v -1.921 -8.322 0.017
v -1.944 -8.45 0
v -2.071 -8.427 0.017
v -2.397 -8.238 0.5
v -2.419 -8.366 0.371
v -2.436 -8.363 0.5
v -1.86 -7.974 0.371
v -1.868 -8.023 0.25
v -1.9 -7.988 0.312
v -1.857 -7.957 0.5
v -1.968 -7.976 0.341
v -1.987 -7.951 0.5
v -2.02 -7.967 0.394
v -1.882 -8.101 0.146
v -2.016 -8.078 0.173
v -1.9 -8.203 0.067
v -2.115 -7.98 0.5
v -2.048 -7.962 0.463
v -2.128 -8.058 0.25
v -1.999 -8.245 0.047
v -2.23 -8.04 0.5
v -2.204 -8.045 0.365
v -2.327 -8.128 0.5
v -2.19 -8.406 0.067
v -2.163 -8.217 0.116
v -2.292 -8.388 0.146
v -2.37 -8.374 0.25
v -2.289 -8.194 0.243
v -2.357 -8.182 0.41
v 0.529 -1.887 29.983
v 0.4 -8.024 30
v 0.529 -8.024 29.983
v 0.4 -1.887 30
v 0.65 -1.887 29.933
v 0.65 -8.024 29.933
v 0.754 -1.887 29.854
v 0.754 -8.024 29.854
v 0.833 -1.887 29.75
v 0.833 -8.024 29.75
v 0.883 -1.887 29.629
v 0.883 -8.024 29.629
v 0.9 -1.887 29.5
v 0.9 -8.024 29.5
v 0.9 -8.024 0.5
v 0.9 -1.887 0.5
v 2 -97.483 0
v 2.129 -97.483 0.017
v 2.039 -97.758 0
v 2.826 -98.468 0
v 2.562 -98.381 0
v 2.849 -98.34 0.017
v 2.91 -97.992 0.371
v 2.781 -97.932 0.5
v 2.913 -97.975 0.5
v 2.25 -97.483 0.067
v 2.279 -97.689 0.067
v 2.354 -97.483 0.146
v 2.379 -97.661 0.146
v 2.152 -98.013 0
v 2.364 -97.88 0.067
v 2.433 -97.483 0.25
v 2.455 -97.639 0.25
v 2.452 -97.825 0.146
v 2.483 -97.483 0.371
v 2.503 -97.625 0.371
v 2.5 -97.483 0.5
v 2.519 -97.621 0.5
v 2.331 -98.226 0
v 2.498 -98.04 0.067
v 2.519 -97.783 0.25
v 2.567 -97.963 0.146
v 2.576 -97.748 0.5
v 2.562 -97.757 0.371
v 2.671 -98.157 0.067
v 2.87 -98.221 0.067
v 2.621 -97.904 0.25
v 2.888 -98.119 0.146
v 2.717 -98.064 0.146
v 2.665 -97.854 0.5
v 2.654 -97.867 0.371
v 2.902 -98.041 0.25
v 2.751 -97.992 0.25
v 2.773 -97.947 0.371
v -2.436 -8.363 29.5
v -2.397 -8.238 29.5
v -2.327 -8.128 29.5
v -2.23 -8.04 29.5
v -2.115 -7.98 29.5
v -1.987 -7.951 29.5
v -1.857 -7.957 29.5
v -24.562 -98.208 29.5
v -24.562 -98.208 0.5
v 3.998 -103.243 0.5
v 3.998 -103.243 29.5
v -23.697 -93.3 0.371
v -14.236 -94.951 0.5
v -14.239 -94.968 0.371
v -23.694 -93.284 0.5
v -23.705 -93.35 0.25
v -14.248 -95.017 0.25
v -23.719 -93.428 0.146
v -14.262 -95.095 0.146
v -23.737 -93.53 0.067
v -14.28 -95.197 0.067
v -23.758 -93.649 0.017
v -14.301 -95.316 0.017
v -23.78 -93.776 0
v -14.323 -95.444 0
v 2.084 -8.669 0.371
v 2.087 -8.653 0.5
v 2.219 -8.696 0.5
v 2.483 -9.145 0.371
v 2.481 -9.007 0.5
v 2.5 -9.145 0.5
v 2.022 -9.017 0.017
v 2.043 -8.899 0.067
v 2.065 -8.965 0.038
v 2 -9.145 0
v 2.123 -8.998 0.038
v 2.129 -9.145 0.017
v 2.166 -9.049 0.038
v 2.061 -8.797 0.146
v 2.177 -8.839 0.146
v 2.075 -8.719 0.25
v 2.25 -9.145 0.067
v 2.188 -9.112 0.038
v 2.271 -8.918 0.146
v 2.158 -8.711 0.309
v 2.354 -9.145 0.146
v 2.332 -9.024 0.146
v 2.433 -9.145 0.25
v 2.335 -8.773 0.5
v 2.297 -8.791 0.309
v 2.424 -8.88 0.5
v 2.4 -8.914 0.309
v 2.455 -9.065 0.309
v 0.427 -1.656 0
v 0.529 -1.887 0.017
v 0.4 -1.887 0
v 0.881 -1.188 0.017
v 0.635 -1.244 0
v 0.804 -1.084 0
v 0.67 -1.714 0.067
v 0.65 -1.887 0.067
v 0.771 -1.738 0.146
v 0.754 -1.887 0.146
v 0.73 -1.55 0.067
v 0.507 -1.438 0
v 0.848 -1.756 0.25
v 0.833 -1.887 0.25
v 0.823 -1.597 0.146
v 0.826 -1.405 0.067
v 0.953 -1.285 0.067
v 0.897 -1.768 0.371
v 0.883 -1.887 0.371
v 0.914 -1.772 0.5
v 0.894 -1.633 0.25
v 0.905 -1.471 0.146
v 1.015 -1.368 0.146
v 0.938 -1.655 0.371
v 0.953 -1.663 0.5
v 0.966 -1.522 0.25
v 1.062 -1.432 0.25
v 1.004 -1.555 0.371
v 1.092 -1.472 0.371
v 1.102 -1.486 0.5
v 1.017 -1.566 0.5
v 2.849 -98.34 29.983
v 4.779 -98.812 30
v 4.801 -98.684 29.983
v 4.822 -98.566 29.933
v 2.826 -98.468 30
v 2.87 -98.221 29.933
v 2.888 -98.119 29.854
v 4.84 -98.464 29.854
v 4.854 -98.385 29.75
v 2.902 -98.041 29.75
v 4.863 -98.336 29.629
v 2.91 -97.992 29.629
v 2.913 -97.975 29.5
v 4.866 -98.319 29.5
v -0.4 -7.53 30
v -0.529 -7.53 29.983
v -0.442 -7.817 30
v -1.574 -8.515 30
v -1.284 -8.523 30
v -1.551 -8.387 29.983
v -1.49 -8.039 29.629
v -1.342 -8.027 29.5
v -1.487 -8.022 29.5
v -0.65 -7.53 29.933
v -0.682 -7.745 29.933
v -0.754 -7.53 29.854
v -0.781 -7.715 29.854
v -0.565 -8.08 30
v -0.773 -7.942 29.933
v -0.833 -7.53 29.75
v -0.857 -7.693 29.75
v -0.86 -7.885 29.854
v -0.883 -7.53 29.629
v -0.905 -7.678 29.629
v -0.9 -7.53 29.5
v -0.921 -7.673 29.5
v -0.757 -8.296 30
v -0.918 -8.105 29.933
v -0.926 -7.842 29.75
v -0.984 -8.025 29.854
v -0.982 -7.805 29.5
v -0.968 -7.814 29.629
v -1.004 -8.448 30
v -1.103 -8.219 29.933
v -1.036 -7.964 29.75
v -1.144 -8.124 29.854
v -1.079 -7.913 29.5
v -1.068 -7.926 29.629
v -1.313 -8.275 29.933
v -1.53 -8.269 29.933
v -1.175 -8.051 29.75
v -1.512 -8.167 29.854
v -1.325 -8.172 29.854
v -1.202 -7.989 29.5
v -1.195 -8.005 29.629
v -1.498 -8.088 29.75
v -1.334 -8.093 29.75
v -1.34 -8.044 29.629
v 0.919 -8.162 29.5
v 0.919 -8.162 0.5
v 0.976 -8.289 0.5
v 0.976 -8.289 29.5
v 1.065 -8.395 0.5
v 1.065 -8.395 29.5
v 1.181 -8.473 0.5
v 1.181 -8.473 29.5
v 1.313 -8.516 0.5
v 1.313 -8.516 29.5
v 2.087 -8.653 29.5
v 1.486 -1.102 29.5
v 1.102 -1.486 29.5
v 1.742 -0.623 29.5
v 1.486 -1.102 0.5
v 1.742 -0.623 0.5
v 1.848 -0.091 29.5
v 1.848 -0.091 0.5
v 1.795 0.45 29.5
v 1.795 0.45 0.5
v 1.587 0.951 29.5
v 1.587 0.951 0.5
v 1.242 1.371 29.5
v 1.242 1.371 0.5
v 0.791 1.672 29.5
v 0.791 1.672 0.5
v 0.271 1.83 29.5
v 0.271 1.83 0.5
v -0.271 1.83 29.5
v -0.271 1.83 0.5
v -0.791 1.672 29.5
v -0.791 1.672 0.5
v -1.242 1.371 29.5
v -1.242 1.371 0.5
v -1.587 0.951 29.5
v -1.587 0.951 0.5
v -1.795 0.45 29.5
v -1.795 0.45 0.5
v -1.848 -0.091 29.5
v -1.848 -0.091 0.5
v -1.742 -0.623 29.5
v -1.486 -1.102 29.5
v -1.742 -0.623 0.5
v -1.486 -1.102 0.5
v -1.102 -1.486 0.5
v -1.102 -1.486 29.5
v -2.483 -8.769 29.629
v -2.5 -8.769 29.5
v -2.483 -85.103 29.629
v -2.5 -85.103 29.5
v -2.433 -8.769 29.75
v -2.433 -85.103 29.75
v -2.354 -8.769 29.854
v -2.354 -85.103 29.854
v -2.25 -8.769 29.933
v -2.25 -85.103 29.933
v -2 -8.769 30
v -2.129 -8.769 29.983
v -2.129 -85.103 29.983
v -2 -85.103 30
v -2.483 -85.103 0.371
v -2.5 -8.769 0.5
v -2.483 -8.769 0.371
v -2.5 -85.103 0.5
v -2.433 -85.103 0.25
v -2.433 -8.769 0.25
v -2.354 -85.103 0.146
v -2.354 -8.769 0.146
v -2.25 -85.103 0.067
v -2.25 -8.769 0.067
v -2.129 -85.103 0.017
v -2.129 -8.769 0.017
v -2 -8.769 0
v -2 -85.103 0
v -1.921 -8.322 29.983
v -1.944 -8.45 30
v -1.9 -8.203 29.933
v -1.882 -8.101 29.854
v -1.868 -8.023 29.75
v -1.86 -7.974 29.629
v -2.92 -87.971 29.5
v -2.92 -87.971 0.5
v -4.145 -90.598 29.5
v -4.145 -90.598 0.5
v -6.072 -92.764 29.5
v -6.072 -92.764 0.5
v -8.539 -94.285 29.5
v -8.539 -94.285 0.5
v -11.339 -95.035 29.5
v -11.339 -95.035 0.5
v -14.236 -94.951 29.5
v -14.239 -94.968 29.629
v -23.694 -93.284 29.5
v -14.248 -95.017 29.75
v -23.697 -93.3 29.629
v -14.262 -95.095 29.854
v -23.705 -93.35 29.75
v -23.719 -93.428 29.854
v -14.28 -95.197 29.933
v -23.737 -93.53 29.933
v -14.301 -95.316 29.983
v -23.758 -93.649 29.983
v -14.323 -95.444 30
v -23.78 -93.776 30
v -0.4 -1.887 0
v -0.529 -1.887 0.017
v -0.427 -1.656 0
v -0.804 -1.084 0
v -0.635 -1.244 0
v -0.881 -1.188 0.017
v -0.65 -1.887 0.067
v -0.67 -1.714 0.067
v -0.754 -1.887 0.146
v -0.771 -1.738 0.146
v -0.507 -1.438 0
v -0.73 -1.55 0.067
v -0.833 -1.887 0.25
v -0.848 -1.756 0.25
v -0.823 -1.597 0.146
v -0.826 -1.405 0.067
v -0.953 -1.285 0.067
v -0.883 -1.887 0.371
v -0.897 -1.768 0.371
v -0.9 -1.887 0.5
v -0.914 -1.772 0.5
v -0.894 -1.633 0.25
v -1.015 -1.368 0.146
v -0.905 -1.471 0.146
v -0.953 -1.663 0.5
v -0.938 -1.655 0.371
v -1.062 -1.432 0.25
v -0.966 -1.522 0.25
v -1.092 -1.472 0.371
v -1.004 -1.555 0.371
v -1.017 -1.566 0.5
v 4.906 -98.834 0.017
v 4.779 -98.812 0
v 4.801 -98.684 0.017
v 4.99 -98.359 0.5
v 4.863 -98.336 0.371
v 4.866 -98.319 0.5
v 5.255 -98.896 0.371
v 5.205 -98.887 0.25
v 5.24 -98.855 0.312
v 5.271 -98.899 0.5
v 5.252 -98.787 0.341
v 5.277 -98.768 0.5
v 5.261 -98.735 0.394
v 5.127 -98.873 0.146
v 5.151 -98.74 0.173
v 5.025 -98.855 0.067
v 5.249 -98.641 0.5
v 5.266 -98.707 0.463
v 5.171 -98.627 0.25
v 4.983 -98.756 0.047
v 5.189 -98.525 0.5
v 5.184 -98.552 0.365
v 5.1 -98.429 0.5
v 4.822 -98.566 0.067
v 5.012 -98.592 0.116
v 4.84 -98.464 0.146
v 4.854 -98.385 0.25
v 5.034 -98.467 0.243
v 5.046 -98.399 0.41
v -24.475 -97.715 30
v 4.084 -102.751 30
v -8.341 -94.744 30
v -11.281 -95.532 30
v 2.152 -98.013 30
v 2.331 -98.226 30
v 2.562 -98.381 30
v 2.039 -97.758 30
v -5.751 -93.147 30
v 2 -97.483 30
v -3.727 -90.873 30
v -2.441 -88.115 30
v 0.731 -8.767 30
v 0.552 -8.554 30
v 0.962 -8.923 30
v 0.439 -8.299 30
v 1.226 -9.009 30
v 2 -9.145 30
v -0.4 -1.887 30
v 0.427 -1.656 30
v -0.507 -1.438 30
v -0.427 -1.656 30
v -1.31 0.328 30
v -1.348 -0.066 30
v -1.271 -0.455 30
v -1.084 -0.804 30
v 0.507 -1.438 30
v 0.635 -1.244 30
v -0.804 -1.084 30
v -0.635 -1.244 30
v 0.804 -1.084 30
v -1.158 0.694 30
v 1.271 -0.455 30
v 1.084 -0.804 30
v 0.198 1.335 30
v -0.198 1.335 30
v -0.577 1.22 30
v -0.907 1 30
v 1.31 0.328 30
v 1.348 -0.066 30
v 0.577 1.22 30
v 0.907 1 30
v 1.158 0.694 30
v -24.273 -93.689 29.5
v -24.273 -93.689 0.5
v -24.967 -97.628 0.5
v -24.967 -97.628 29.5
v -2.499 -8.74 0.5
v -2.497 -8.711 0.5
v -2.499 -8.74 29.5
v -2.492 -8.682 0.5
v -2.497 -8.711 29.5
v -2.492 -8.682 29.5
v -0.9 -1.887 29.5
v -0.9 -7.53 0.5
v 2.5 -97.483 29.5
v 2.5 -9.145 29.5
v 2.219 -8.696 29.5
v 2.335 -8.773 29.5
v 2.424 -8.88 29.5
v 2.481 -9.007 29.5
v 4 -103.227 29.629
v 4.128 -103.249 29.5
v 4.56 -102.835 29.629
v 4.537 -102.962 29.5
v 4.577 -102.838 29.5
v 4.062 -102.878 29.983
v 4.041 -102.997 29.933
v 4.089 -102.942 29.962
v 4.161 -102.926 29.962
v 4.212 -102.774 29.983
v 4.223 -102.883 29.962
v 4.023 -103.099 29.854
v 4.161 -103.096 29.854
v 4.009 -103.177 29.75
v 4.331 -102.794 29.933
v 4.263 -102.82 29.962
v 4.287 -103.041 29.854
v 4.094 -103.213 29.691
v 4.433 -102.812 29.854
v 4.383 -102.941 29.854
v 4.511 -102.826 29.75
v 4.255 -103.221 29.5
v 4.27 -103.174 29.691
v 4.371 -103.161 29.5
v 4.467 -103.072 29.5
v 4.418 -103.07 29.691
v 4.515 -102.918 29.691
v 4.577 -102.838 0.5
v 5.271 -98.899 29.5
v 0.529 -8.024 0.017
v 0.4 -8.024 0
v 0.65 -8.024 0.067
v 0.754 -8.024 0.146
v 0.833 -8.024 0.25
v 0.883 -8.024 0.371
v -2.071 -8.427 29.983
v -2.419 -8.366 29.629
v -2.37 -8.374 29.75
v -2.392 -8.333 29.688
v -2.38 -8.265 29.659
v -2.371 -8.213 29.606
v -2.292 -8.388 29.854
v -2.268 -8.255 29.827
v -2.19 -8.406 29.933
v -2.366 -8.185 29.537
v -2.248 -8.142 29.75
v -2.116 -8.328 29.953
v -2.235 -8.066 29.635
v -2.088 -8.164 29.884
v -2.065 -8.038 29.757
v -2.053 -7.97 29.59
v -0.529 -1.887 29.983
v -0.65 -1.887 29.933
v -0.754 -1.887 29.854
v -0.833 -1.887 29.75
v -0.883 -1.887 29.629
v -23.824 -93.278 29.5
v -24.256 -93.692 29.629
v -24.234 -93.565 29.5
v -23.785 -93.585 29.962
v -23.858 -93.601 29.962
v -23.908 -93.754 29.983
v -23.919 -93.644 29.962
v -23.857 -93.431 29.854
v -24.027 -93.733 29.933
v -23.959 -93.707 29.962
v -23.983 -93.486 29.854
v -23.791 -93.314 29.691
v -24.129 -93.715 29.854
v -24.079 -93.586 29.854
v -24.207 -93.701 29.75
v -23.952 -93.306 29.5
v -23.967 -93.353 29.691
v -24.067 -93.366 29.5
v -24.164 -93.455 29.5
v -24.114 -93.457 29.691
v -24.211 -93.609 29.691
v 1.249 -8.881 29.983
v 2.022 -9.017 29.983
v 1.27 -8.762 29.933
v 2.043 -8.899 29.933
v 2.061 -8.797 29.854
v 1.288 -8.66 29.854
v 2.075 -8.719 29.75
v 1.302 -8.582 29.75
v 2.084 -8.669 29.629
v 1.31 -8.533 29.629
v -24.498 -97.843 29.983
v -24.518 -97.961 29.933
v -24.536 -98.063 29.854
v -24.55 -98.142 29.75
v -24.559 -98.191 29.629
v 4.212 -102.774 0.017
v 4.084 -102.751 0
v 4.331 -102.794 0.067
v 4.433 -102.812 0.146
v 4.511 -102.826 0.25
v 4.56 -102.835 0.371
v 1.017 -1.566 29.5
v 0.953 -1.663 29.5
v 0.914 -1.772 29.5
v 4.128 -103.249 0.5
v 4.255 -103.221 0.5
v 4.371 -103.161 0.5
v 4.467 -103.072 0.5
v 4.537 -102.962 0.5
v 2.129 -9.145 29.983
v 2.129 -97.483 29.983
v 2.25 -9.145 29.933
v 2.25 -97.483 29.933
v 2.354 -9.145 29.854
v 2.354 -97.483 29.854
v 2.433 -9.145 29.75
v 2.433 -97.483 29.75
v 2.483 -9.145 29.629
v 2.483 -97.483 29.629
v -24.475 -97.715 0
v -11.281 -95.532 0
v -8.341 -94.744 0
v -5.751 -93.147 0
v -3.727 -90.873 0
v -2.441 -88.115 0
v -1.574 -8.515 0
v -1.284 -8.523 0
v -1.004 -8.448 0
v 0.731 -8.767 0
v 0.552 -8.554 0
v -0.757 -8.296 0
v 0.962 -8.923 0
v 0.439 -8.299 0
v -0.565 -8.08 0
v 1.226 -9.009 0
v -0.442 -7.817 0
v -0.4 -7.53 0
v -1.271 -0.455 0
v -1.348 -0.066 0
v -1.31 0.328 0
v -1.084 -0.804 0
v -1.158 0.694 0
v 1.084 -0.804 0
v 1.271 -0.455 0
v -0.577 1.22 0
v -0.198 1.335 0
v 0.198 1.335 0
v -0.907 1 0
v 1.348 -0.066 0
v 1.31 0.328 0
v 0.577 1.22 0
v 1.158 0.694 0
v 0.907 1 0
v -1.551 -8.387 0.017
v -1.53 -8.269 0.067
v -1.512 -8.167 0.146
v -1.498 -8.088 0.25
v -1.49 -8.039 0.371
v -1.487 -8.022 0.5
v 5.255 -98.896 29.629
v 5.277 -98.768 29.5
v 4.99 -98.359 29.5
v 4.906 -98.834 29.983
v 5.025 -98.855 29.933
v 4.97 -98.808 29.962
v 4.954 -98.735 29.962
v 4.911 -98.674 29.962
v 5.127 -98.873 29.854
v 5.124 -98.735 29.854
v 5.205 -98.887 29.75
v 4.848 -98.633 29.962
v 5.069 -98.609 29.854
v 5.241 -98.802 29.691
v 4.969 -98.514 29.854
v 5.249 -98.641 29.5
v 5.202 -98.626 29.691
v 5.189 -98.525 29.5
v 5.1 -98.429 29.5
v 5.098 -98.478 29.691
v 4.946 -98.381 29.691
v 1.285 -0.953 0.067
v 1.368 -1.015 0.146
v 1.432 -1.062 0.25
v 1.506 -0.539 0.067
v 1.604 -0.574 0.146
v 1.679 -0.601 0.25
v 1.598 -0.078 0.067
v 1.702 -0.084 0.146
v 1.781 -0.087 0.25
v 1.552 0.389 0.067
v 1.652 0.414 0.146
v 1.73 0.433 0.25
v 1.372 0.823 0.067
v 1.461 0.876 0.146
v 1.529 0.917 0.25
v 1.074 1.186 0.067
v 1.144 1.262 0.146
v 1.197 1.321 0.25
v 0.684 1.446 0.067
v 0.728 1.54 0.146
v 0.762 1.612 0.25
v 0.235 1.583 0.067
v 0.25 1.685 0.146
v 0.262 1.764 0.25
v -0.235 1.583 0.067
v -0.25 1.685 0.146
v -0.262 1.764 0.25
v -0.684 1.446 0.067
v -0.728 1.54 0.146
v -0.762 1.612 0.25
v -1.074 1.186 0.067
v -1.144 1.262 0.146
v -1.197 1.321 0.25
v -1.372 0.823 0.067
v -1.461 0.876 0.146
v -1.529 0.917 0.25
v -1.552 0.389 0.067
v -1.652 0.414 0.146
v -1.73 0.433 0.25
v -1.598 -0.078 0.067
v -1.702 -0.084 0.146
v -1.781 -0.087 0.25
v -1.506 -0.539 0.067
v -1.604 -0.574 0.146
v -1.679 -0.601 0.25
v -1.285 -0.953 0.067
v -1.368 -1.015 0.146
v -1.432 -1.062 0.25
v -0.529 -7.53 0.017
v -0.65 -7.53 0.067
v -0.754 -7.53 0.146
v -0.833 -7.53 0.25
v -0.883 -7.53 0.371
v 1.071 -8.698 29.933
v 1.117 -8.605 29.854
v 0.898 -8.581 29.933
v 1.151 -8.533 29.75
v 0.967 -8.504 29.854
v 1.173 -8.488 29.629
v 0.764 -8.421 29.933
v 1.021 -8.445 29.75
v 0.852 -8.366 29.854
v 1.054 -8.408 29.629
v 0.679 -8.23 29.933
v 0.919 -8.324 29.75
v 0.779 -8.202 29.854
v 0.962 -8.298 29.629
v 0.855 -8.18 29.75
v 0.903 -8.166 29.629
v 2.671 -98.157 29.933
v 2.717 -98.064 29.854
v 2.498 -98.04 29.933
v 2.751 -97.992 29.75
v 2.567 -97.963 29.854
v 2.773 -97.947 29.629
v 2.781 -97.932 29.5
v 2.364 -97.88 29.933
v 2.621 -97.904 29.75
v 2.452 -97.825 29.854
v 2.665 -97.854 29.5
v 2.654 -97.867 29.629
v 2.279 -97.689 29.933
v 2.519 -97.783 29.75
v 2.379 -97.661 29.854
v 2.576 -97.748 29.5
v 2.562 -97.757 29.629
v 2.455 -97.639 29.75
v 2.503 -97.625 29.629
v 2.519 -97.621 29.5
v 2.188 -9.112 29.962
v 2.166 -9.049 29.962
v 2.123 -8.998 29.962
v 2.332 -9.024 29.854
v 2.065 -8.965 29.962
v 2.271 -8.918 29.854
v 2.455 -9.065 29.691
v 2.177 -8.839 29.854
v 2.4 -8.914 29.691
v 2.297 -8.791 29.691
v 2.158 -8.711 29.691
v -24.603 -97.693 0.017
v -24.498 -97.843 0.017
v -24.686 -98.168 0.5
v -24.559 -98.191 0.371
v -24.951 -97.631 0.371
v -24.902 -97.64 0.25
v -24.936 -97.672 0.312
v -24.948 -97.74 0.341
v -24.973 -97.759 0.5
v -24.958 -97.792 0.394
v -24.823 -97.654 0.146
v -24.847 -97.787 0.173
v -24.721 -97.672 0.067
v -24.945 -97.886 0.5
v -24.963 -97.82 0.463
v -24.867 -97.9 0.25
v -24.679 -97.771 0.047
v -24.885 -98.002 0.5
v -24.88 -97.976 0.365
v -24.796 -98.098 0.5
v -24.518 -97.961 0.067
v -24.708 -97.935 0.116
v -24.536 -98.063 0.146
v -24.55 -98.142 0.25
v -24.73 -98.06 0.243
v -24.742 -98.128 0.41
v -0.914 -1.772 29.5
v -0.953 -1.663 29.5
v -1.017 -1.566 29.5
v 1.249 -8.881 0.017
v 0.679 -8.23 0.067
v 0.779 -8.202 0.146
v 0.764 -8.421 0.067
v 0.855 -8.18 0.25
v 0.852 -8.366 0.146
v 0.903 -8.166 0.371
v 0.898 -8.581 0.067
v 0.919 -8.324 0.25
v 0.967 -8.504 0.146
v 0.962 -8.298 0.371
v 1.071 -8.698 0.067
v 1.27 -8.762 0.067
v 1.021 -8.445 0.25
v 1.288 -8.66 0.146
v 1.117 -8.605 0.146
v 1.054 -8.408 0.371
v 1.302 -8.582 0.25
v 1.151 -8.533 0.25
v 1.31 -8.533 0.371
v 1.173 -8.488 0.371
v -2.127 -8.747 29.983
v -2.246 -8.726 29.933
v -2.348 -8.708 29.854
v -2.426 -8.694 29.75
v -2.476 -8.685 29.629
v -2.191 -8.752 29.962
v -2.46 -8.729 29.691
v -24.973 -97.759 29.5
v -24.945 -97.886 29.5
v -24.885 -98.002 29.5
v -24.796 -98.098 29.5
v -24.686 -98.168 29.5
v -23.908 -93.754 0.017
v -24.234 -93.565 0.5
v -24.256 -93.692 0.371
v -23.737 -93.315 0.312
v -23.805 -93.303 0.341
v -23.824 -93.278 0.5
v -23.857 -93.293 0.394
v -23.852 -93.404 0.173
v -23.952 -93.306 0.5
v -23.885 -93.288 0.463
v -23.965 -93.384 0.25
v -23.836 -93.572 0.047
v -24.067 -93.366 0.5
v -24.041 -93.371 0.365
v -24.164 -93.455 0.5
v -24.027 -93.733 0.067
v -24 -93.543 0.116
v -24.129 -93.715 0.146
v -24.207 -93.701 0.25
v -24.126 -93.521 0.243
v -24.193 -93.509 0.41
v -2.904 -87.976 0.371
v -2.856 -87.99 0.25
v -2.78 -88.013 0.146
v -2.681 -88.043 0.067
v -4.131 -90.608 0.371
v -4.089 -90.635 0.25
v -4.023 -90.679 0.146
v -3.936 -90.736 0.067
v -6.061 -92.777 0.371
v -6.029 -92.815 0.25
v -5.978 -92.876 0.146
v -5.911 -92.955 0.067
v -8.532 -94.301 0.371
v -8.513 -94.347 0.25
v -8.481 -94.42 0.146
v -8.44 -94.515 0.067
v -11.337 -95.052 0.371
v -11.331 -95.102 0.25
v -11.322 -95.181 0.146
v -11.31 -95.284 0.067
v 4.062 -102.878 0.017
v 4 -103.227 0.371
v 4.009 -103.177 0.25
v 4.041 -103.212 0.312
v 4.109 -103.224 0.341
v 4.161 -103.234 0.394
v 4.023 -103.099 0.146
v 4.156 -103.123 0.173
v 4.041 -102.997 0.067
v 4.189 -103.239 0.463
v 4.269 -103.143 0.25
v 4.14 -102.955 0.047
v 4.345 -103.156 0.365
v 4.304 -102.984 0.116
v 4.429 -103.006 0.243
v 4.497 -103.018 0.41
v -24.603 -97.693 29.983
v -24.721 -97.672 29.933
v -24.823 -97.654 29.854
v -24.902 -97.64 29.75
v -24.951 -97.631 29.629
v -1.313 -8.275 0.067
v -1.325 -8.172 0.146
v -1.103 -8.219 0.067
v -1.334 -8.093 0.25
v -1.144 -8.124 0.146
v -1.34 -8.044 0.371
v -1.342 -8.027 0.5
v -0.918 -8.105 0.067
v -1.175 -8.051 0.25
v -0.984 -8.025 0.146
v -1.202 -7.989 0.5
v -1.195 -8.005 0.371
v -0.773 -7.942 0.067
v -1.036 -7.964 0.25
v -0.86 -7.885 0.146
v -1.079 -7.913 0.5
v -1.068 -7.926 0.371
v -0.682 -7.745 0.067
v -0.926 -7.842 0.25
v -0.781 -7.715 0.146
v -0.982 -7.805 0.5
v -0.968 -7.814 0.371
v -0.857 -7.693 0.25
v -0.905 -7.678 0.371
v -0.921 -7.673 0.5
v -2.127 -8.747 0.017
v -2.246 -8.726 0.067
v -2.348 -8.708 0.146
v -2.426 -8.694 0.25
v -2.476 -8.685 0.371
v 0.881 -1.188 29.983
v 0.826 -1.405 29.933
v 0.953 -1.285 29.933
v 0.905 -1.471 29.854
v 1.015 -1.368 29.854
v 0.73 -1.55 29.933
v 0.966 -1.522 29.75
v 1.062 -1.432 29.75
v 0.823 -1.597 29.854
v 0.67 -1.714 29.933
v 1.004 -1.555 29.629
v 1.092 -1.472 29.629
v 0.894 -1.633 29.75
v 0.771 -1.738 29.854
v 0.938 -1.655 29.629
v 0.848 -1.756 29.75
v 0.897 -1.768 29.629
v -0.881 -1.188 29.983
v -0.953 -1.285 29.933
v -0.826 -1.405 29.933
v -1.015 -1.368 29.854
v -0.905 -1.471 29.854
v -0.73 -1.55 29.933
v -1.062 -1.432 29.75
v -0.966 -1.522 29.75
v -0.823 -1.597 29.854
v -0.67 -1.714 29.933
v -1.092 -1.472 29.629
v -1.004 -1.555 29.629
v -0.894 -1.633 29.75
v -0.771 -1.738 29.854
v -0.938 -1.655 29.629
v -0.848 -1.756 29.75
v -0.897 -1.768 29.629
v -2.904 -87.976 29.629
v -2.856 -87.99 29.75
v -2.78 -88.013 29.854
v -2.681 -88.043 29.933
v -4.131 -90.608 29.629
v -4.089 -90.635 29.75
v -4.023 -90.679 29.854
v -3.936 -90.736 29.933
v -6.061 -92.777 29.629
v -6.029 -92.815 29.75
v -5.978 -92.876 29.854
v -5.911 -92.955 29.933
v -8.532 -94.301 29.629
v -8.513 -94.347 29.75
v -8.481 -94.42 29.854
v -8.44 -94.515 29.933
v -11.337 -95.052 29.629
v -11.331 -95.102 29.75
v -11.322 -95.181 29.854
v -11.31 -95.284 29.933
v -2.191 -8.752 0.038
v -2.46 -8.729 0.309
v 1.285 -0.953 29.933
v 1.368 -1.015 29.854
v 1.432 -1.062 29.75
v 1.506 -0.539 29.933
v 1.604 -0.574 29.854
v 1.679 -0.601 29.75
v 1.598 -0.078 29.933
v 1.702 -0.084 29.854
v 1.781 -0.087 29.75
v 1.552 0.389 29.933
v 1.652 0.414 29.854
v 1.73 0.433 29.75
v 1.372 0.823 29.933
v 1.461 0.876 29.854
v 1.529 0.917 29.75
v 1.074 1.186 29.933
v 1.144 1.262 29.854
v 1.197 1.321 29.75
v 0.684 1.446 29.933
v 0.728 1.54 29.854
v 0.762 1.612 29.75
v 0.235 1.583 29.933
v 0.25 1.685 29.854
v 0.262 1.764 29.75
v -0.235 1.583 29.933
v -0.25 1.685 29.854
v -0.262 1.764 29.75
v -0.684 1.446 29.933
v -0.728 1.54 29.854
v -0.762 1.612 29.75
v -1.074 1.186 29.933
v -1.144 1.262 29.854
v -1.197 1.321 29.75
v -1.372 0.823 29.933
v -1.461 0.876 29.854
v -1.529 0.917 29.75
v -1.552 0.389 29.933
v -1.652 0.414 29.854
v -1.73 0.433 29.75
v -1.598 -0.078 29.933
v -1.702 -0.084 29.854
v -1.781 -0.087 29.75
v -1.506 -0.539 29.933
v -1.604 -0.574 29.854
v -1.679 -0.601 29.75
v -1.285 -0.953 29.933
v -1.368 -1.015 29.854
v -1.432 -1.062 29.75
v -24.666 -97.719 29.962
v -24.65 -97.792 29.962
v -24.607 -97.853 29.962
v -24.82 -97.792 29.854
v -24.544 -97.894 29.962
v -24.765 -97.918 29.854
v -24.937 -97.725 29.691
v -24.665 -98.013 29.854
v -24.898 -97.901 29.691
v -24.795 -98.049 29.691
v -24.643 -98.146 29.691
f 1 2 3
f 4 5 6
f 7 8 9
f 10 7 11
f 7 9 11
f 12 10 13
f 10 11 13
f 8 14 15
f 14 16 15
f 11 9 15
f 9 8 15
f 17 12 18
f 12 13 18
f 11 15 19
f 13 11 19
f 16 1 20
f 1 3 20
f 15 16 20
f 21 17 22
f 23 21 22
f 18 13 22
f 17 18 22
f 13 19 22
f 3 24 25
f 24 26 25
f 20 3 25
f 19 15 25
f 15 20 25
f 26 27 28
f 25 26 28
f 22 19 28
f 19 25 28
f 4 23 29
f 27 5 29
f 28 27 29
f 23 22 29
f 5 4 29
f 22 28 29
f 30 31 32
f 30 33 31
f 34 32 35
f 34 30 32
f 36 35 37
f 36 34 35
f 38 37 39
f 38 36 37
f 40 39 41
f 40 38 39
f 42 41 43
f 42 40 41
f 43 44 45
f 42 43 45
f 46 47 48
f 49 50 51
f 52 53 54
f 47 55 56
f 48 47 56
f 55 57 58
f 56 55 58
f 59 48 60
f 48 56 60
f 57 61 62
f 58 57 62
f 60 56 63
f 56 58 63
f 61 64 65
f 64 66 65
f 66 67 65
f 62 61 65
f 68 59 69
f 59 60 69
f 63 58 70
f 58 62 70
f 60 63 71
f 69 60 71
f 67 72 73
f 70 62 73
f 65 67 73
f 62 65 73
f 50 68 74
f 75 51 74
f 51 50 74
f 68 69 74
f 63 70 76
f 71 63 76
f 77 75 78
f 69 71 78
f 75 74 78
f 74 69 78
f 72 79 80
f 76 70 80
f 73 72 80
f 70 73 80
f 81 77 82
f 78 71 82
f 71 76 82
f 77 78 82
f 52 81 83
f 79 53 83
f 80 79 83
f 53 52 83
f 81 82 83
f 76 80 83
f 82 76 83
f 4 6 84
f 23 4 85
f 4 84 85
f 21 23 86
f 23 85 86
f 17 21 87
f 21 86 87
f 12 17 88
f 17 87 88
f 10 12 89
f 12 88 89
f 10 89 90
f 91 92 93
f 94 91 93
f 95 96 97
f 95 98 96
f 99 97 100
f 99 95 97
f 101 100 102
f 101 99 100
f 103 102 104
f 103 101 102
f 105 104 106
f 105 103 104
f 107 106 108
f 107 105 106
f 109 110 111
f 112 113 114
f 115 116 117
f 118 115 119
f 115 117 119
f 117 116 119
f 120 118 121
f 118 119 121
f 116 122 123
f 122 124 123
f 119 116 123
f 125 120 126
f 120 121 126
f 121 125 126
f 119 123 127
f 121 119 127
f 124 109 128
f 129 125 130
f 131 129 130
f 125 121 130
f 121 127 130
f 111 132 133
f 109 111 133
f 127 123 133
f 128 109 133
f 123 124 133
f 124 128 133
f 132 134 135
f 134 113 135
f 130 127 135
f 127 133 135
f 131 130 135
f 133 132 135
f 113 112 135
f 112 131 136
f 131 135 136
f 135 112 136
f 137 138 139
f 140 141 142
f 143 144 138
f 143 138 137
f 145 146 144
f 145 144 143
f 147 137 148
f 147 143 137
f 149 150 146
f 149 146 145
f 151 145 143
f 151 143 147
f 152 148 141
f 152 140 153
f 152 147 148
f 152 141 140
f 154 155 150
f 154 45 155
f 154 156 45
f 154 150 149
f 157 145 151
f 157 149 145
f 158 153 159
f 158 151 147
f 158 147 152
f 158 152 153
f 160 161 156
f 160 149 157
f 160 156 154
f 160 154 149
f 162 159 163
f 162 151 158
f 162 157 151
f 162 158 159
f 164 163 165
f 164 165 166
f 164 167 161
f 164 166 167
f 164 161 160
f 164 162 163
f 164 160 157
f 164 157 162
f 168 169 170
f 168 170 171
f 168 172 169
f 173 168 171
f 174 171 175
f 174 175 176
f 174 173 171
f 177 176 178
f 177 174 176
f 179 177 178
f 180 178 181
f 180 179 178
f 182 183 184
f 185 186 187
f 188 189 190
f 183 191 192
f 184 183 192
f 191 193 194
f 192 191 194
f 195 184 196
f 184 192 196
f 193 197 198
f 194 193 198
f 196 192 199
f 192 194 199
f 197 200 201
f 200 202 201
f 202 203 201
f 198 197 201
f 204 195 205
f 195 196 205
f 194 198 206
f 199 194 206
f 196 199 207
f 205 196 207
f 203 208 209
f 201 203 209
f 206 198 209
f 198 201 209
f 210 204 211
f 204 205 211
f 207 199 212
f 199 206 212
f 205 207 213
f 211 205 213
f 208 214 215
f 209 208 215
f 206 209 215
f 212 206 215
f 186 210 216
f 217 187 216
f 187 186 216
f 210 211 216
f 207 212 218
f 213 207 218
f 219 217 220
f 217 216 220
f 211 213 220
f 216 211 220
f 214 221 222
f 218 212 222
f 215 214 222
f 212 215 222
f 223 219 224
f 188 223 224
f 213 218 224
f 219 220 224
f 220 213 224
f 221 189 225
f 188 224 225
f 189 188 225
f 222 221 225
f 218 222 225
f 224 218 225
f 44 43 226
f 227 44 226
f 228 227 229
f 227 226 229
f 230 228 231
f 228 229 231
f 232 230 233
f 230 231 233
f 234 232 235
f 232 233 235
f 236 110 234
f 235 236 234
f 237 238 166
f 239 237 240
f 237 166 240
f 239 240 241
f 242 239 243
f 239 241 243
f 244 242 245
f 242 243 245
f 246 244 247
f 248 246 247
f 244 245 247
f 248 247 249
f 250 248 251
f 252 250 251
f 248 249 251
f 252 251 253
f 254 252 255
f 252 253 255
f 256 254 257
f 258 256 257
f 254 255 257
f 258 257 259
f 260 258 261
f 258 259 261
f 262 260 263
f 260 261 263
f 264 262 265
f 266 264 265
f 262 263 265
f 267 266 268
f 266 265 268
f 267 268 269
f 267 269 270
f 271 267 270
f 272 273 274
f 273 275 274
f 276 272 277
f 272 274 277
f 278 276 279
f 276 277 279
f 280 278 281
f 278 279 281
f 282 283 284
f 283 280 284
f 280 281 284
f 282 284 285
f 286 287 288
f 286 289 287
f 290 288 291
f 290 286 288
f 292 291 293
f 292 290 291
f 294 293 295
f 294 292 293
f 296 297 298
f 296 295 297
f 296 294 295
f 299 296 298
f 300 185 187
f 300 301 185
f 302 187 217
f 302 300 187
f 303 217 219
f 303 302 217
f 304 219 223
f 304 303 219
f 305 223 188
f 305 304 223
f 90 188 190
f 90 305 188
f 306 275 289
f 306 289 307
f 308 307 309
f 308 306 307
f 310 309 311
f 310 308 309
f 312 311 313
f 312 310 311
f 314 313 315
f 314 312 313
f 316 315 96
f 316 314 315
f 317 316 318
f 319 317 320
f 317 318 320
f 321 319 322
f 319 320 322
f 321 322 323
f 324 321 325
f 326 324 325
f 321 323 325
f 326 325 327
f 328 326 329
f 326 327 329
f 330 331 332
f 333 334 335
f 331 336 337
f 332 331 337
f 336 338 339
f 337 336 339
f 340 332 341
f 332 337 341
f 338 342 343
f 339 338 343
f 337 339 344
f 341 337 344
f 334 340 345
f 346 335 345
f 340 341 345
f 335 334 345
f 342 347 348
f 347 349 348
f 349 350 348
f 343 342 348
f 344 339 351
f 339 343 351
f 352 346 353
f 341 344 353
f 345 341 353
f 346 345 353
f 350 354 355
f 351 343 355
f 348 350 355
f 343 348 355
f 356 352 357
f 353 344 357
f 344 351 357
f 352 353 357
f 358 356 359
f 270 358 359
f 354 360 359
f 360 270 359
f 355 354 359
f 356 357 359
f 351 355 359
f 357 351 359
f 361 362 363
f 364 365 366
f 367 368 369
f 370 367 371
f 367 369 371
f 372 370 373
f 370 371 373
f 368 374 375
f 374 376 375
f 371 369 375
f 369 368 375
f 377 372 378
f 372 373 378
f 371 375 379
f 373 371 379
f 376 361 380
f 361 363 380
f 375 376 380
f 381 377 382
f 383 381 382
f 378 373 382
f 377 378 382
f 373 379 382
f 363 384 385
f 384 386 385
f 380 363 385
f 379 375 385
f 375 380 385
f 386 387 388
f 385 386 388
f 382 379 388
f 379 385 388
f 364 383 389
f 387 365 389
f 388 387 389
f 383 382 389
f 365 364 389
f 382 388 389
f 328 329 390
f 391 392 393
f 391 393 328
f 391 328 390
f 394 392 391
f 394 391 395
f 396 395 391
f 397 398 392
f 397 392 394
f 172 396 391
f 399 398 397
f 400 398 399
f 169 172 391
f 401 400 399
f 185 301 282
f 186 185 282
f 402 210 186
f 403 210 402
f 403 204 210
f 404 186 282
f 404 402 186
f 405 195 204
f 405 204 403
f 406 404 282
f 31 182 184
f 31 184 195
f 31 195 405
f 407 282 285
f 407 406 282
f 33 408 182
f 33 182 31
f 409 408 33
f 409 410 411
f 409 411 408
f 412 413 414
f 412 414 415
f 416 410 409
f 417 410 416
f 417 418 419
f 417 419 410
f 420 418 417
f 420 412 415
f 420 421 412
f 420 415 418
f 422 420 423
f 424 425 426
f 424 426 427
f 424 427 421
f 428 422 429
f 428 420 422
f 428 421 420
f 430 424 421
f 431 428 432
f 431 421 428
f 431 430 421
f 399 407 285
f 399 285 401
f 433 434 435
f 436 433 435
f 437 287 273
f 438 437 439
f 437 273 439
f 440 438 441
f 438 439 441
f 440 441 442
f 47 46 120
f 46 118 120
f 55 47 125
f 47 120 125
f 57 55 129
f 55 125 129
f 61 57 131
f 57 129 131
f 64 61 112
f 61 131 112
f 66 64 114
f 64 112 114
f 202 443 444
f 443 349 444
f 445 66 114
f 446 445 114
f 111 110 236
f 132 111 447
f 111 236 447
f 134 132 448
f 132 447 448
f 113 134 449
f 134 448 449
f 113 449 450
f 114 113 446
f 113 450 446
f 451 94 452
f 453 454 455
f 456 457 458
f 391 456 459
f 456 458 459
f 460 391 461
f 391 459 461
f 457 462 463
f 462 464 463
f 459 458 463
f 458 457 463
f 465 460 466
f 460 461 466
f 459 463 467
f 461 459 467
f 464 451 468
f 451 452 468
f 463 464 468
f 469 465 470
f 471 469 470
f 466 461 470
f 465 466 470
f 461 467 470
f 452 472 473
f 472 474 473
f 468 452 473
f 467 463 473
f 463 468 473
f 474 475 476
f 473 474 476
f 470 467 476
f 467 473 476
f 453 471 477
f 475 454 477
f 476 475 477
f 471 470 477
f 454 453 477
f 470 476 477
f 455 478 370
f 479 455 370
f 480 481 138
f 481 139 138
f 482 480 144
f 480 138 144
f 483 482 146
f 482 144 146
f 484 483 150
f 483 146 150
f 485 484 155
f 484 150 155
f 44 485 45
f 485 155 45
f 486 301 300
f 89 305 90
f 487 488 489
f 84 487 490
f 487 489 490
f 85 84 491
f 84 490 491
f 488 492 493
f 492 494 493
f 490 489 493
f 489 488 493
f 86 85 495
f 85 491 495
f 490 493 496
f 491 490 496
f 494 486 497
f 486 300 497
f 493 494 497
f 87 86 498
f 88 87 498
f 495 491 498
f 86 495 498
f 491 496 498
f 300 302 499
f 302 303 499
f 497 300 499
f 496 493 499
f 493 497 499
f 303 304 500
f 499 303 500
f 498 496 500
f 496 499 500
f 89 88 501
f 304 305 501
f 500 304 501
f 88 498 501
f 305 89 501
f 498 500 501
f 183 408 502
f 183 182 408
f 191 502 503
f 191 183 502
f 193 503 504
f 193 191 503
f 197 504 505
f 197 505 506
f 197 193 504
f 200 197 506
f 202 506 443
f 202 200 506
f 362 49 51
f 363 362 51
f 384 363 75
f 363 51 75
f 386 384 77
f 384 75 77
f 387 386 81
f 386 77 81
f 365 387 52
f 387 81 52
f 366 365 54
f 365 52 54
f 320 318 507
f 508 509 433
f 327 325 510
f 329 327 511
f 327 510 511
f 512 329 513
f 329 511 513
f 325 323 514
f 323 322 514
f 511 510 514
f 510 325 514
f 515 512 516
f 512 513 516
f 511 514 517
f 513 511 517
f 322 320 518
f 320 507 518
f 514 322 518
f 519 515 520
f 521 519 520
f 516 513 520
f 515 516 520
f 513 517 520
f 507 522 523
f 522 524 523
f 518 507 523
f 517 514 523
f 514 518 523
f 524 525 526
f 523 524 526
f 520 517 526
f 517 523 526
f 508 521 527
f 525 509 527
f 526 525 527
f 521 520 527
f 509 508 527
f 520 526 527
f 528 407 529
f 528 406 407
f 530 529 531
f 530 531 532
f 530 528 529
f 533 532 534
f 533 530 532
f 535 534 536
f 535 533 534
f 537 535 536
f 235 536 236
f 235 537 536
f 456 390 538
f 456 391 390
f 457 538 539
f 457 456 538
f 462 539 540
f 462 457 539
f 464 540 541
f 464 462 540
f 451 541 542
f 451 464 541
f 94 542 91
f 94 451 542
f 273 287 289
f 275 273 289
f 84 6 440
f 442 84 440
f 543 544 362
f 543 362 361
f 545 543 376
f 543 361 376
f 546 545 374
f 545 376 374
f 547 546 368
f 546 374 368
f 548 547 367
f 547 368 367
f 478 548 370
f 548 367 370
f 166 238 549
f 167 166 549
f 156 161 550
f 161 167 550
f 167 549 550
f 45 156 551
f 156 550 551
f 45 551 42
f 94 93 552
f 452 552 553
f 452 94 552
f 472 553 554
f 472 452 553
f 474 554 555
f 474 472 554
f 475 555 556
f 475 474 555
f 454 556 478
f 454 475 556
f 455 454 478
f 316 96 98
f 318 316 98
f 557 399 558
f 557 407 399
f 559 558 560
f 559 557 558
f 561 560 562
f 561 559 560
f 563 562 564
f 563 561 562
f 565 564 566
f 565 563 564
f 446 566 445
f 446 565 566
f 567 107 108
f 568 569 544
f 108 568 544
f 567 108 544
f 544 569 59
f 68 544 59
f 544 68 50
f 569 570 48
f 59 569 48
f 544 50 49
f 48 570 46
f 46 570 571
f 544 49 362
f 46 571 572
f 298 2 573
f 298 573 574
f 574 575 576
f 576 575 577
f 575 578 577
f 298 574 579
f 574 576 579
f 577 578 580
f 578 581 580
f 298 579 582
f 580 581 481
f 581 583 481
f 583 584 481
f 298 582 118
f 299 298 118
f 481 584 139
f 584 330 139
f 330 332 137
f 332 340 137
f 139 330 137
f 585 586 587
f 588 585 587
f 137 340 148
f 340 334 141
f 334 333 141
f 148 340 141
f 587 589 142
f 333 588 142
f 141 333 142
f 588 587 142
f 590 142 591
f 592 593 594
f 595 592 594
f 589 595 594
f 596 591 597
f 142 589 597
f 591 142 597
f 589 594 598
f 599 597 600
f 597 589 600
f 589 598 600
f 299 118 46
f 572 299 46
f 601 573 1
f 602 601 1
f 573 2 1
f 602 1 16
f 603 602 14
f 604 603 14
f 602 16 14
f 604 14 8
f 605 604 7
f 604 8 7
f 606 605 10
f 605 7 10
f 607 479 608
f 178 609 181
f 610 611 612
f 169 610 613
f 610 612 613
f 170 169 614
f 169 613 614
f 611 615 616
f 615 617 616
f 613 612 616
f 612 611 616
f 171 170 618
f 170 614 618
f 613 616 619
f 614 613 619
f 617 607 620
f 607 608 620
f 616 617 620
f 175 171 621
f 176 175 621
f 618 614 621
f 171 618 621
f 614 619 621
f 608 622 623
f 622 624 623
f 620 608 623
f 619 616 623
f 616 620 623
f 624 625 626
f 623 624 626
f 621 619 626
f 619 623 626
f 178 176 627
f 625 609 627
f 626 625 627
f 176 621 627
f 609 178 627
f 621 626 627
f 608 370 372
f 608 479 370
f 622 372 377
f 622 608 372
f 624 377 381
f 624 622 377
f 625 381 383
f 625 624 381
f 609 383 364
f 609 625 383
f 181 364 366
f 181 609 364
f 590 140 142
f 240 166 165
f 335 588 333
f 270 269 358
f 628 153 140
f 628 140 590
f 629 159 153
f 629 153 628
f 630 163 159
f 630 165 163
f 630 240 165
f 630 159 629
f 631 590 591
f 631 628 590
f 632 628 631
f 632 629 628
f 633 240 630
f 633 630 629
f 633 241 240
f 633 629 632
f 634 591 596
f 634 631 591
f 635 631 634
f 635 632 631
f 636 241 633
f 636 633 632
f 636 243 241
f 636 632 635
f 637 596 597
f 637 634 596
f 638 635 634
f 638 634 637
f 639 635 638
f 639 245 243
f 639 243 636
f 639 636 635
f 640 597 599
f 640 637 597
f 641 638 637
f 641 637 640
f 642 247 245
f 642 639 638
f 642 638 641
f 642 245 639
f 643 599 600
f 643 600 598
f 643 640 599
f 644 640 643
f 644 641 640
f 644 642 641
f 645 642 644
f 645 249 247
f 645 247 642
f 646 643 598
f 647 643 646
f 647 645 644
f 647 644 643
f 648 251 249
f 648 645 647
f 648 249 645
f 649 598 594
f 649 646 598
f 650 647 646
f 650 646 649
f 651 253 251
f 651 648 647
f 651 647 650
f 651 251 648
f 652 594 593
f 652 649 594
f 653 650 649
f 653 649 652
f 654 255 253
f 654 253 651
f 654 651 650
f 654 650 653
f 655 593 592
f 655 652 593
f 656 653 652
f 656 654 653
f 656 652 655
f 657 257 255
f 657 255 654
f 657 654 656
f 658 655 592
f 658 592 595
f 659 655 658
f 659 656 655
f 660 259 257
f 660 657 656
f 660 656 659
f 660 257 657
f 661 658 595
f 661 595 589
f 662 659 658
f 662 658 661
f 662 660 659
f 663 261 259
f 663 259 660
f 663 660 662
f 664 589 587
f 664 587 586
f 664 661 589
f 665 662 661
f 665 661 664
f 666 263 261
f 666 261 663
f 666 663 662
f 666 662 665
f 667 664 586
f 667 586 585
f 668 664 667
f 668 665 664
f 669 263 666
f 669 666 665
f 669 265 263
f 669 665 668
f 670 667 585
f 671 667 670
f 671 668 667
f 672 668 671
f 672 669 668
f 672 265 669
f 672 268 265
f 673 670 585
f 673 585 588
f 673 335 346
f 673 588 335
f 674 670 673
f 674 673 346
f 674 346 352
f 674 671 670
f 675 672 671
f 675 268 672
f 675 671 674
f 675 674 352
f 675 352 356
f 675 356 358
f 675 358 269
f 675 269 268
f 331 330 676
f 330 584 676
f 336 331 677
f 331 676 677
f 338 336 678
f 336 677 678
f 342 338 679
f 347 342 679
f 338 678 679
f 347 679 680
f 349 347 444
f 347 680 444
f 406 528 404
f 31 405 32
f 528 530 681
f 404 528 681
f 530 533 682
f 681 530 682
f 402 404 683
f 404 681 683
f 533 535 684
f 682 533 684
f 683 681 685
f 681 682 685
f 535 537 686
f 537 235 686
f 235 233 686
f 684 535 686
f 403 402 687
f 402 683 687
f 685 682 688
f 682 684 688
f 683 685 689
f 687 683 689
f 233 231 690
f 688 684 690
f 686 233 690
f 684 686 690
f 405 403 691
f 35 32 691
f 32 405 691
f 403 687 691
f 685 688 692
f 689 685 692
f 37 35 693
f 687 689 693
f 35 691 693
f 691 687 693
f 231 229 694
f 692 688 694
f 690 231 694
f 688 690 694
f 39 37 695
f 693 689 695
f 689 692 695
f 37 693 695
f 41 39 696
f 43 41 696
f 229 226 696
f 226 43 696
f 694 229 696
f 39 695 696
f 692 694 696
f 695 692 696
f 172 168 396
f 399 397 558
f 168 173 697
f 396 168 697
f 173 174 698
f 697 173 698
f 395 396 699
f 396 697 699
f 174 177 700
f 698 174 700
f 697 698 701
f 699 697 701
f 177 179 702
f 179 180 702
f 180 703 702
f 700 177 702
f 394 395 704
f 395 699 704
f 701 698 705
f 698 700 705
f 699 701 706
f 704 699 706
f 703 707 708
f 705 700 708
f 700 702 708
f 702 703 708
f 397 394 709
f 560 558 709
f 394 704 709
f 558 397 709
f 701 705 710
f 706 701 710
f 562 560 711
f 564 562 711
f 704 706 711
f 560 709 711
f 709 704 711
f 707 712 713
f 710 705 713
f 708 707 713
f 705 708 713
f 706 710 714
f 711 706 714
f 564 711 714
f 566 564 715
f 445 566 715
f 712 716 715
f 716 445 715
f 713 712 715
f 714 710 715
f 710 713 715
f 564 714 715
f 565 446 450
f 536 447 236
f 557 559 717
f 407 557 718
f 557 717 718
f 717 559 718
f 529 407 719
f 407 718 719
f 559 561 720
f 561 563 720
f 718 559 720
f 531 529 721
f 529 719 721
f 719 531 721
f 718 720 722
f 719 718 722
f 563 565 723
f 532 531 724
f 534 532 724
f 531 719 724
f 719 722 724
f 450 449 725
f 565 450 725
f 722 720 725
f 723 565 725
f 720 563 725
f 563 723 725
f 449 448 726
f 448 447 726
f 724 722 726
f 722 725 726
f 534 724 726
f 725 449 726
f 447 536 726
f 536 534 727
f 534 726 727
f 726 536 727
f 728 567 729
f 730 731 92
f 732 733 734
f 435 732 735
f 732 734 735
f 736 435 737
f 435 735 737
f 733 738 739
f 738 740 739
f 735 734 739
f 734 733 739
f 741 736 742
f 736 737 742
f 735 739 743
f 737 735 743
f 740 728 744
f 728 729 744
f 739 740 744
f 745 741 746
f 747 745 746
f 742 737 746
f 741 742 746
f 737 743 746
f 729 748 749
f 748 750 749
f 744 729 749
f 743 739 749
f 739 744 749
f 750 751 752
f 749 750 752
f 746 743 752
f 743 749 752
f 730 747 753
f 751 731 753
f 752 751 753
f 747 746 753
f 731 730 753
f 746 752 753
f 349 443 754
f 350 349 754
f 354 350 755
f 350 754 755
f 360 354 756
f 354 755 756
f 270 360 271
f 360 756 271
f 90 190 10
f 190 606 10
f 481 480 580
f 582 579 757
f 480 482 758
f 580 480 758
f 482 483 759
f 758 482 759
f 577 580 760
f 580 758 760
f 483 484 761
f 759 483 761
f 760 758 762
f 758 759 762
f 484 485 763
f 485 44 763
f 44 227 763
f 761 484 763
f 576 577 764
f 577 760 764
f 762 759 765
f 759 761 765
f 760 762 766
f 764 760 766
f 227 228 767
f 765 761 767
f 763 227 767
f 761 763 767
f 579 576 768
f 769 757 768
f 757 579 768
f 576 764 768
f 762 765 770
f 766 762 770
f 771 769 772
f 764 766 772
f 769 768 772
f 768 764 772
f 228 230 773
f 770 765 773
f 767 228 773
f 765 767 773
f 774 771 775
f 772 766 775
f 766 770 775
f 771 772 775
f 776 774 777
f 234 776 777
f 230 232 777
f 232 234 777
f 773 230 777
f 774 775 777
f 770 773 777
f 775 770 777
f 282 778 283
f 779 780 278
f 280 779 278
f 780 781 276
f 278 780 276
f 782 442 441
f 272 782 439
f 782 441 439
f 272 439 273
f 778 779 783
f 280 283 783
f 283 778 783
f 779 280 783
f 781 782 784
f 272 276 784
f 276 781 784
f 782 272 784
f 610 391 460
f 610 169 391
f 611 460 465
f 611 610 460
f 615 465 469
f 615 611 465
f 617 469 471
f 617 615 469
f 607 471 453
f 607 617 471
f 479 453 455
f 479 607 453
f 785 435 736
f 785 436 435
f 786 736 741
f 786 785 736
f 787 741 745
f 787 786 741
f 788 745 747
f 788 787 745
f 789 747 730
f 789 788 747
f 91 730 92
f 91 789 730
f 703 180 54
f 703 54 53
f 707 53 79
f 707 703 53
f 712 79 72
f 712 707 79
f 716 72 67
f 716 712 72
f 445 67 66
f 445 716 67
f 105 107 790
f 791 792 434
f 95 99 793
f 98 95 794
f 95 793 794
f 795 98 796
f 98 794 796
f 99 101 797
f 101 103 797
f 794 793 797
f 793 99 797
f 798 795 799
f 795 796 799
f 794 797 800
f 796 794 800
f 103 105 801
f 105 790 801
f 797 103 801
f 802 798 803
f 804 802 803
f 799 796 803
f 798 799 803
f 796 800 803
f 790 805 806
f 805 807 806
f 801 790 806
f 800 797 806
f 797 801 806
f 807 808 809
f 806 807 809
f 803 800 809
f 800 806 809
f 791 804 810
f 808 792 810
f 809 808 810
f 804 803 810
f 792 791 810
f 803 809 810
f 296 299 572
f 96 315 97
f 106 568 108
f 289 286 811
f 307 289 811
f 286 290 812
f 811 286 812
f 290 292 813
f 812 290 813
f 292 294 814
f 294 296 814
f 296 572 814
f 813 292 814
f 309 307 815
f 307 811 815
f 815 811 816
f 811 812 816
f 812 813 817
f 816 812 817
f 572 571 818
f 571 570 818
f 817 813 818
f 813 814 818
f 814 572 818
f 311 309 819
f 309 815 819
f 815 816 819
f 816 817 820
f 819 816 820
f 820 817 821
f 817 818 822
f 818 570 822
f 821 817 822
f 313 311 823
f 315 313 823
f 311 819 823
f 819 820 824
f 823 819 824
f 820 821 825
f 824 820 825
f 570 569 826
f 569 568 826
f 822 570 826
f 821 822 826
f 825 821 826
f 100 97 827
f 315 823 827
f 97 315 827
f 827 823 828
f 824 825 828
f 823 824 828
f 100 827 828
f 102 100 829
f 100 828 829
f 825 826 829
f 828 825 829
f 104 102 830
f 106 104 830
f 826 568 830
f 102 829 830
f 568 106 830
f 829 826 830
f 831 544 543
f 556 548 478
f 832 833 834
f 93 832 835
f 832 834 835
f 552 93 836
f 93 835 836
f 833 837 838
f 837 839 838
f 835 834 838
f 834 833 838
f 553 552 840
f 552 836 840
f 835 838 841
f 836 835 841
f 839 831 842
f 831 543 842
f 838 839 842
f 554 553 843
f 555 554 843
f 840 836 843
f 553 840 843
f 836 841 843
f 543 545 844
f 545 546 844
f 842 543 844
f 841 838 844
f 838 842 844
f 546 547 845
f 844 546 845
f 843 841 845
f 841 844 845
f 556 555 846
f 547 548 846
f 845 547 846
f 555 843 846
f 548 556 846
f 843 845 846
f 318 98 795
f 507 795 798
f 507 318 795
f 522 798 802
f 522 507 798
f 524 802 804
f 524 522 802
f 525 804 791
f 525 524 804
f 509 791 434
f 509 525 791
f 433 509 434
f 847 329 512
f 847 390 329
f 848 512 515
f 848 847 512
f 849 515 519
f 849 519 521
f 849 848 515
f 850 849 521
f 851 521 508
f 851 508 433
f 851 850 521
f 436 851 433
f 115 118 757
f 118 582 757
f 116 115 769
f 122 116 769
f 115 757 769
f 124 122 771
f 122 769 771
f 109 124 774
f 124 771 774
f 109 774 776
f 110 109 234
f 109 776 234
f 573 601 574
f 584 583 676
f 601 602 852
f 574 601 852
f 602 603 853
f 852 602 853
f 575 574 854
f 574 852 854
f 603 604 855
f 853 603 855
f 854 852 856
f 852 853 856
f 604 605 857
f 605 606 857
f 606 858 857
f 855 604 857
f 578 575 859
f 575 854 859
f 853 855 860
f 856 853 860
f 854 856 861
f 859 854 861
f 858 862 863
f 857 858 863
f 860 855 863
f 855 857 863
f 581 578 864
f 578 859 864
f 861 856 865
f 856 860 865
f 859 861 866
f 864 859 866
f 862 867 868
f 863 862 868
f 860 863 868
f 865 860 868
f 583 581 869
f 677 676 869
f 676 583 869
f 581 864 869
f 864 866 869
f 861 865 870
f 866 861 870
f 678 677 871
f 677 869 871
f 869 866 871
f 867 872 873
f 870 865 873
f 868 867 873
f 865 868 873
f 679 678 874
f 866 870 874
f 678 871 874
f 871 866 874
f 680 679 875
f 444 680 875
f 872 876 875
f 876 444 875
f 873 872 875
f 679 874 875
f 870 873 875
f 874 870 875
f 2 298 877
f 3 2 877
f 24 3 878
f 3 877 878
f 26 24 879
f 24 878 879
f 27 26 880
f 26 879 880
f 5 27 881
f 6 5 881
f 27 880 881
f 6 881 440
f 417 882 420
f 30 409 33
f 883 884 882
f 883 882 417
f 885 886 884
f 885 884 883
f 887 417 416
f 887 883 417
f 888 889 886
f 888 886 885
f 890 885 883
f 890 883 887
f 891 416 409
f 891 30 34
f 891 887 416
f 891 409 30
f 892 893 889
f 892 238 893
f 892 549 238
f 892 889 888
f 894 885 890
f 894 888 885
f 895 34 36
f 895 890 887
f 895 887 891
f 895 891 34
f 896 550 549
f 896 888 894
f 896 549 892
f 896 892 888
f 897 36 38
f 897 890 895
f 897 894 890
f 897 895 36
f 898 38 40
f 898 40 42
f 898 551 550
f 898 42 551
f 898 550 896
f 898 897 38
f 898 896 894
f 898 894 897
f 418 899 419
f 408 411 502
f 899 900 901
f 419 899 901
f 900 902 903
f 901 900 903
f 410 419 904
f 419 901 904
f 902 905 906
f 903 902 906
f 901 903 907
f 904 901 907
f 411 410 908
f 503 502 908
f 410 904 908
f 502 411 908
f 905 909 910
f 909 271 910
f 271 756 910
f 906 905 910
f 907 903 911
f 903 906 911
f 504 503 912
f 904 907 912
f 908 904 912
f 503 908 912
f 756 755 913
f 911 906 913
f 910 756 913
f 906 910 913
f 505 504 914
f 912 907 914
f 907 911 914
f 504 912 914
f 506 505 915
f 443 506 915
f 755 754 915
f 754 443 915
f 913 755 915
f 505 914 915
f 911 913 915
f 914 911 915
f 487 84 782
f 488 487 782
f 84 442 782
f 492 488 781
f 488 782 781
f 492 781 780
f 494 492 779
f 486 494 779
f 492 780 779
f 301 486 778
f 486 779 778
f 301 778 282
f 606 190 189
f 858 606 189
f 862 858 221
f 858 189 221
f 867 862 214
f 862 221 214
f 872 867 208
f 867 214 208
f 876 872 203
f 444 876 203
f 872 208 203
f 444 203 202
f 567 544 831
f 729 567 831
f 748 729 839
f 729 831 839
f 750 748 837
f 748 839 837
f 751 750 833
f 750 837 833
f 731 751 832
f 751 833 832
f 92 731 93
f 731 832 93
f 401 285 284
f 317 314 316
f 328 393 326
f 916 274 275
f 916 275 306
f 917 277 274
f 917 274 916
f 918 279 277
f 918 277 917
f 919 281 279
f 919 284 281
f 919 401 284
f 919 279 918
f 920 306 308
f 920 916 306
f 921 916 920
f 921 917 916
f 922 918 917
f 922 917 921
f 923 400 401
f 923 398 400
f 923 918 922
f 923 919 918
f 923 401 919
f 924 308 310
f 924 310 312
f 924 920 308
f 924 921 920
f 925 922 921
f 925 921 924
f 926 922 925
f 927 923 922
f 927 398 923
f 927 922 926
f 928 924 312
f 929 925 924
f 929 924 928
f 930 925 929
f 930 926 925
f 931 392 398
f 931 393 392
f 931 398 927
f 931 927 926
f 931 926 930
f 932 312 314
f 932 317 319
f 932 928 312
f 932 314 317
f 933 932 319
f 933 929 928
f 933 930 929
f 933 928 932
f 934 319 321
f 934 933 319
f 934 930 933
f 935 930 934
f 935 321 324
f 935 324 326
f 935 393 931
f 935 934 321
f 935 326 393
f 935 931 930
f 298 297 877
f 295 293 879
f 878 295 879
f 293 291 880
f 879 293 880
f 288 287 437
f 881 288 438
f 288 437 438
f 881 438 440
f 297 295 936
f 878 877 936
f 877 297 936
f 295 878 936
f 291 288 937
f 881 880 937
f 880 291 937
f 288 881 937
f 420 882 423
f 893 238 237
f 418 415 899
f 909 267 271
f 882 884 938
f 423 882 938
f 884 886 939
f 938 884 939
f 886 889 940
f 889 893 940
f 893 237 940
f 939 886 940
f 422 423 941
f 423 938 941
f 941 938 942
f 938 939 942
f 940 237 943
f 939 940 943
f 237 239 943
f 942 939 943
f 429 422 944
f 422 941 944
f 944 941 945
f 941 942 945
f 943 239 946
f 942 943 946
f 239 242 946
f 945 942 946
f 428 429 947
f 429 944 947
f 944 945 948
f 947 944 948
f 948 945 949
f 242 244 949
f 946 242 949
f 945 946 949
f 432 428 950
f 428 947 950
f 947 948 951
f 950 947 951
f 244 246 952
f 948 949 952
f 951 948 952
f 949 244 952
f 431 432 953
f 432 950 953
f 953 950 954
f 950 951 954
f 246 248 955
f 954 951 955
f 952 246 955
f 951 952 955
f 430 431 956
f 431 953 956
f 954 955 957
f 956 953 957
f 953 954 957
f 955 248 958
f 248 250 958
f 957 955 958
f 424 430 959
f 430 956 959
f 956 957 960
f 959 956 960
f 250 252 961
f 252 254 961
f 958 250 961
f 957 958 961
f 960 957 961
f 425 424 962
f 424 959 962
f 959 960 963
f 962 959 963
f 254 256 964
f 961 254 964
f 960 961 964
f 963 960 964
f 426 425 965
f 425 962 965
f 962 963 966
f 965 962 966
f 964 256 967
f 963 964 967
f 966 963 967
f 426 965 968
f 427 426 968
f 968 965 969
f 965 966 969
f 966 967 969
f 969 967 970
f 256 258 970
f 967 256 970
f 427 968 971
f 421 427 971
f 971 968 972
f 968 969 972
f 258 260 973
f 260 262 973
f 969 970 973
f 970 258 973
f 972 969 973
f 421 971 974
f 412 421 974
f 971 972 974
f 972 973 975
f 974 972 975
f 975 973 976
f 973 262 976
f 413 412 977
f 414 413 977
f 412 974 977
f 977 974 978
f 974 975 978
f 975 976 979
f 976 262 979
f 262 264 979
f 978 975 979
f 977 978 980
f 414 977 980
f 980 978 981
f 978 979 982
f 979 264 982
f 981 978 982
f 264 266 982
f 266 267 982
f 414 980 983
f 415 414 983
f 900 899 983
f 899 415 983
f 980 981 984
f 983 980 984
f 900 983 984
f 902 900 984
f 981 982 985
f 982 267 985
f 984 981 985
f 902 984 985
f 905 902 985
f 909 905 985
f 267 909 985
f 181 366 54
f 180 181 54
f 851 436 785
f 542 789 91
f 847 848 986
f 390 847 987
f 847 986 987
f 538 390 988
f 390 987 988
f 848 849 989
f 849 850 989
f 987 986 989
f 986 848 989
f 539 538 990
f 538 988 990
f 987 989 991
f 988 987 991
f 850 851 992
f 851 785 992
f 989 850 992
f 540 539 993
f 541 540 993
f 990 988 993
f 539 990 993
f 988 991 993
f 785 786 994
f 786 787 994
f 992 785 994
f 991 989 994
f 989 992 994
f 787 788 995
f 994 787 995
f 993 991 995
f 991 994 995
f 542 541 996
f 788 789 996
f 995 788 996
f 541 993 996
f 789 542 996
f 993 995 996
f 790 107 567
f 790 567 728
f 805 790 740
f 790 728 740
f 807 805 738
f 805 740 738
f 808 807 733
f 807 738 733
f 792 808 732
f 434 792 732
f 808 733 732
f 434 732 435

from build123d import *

# Parameters (mm, degrees)
SALIENTE_EXTRUIR1_DEPTH = 30
REDONDEO1_R             = 10
REDONDEO2_R             = 0.5


with BuildPart() as part:
    # Croquis1 → Saliente-Extruir1 (new body)
    with BuildSketch(Plane.XY):
        with BuildLine():
            ThreePointArc((0.9, -1.616322988), (0, 1.85), (-0.9, -1.616322988))
            Line((-0.9, -1.616322988), (-0.9, -8.125879105))
            Line((-0.9, -8.125879105), (-2.349231552, -7.870340482))
            Line((-2.349231552, -7.870340482), (-2.5, -8.72539084))
            Line((-2.5, -8.72539084), (-2.5, -97.020616019))
            Line((-2.5, -97.020616019), (-24.186073381, -93.196776176))
            Line((-24.186073381, -93.196776176), (-25.054314269, -98.120814941))
            Line((-25.054314269, -98.120814941), (4.489918321, -103.330260271))
            Line((4.489918321, -103.330260271), (5.358159209, -98.406221506))
            Line((5.358159209, -98.406221506), (2.5, -97.902250922))
            Line((2.5, -97.902250922), (2.5, -8.72539084))
            Line((2.5, -8.72539084), (0.9, -8.443267671))
            Line((0.9, -8.443267671), (0.9, -1.616322988))
        make_face()
    extrude(amount=SALIENTE_EXTRUIR1_DEPTH)

    # Redondeo1
    redondeo1_edges = [part.edges().sort_by_distance(p)[0] for p in [
        (-2.5, -97.020616019, 15),
    ]]
    fillet(redondeo1_edges, radius=REDONDEO1_R)

    # Redondeo2
    redondeo2_edges = [part.edges().sort_by_distance(p)[0] for p in [
        (-0.9, -4.871101047, 30),
        (-1.624615776, -7.998109794, 30),
        (0.9, -5.029795329, 0),
        (1.7, -8.584329255, 0),
        (2.5, -53.313820881, 0),
        (3.929079605, -98.154236214, 0),
        (4.924038765, -100.868240888, 0),
        (-10.282197974, -100.725537606, 0),
        (-24.620193825, -95.658795558, 0),
        (-2.5, -46.914235466, 0),
        (-2.424615776, -8.297865661, 0),
        (-1.624615776, -7.998109794, 0),
        (-0.9, -4.871101047, 0),
        (0, 1.85, 0),
        (-2.424615776, -8.297865661, 30),
        (0.9, -1.616322988, 15),
        (0.9, -8.443267671, 15),
        (2.5, -8.72539084, 15),
        (2.5, -97.902250922, 15),
        (5.358159209, -98.406221506, 15),
        (4.489918321, -103.330260271, 15),
        (-25.054314269, -98.120814941, 15),
        (-24.186073381, -93.196776176, 15),
        (-2.5, -46.914235466, 30),
        (-2.5, -8.72539084, 15),
        (-2.349231552, -7.870340482, 15),
        (-0.9, -8.125879105, 15),
        (-0.9, -1.616322988, 15),
        (-24.620193825, -95.658795558, 30),
        (-10.282197974, -100.725537606, 30),
        (-19.211277579, -94.073966899, 0),
        (-19.211277579, -94.073966899, 30),
        (-6.072123903, -92.763524524, 0),
        (-6.072123903, -92.763524524, 30),
        (0, 1.85, 30),
        (4.924038765, -100.868240888, 30),
        (3.929079605, -98.154236214, 30),
        (2.5, -53.313820881, 30),
        (1.7, -8.584329255, 30),
        (0.9, -5.029795329, 30),
    ]]
    fillet(redondeo2_edges, radius=REDONDEO2_R)


solid = part.part
